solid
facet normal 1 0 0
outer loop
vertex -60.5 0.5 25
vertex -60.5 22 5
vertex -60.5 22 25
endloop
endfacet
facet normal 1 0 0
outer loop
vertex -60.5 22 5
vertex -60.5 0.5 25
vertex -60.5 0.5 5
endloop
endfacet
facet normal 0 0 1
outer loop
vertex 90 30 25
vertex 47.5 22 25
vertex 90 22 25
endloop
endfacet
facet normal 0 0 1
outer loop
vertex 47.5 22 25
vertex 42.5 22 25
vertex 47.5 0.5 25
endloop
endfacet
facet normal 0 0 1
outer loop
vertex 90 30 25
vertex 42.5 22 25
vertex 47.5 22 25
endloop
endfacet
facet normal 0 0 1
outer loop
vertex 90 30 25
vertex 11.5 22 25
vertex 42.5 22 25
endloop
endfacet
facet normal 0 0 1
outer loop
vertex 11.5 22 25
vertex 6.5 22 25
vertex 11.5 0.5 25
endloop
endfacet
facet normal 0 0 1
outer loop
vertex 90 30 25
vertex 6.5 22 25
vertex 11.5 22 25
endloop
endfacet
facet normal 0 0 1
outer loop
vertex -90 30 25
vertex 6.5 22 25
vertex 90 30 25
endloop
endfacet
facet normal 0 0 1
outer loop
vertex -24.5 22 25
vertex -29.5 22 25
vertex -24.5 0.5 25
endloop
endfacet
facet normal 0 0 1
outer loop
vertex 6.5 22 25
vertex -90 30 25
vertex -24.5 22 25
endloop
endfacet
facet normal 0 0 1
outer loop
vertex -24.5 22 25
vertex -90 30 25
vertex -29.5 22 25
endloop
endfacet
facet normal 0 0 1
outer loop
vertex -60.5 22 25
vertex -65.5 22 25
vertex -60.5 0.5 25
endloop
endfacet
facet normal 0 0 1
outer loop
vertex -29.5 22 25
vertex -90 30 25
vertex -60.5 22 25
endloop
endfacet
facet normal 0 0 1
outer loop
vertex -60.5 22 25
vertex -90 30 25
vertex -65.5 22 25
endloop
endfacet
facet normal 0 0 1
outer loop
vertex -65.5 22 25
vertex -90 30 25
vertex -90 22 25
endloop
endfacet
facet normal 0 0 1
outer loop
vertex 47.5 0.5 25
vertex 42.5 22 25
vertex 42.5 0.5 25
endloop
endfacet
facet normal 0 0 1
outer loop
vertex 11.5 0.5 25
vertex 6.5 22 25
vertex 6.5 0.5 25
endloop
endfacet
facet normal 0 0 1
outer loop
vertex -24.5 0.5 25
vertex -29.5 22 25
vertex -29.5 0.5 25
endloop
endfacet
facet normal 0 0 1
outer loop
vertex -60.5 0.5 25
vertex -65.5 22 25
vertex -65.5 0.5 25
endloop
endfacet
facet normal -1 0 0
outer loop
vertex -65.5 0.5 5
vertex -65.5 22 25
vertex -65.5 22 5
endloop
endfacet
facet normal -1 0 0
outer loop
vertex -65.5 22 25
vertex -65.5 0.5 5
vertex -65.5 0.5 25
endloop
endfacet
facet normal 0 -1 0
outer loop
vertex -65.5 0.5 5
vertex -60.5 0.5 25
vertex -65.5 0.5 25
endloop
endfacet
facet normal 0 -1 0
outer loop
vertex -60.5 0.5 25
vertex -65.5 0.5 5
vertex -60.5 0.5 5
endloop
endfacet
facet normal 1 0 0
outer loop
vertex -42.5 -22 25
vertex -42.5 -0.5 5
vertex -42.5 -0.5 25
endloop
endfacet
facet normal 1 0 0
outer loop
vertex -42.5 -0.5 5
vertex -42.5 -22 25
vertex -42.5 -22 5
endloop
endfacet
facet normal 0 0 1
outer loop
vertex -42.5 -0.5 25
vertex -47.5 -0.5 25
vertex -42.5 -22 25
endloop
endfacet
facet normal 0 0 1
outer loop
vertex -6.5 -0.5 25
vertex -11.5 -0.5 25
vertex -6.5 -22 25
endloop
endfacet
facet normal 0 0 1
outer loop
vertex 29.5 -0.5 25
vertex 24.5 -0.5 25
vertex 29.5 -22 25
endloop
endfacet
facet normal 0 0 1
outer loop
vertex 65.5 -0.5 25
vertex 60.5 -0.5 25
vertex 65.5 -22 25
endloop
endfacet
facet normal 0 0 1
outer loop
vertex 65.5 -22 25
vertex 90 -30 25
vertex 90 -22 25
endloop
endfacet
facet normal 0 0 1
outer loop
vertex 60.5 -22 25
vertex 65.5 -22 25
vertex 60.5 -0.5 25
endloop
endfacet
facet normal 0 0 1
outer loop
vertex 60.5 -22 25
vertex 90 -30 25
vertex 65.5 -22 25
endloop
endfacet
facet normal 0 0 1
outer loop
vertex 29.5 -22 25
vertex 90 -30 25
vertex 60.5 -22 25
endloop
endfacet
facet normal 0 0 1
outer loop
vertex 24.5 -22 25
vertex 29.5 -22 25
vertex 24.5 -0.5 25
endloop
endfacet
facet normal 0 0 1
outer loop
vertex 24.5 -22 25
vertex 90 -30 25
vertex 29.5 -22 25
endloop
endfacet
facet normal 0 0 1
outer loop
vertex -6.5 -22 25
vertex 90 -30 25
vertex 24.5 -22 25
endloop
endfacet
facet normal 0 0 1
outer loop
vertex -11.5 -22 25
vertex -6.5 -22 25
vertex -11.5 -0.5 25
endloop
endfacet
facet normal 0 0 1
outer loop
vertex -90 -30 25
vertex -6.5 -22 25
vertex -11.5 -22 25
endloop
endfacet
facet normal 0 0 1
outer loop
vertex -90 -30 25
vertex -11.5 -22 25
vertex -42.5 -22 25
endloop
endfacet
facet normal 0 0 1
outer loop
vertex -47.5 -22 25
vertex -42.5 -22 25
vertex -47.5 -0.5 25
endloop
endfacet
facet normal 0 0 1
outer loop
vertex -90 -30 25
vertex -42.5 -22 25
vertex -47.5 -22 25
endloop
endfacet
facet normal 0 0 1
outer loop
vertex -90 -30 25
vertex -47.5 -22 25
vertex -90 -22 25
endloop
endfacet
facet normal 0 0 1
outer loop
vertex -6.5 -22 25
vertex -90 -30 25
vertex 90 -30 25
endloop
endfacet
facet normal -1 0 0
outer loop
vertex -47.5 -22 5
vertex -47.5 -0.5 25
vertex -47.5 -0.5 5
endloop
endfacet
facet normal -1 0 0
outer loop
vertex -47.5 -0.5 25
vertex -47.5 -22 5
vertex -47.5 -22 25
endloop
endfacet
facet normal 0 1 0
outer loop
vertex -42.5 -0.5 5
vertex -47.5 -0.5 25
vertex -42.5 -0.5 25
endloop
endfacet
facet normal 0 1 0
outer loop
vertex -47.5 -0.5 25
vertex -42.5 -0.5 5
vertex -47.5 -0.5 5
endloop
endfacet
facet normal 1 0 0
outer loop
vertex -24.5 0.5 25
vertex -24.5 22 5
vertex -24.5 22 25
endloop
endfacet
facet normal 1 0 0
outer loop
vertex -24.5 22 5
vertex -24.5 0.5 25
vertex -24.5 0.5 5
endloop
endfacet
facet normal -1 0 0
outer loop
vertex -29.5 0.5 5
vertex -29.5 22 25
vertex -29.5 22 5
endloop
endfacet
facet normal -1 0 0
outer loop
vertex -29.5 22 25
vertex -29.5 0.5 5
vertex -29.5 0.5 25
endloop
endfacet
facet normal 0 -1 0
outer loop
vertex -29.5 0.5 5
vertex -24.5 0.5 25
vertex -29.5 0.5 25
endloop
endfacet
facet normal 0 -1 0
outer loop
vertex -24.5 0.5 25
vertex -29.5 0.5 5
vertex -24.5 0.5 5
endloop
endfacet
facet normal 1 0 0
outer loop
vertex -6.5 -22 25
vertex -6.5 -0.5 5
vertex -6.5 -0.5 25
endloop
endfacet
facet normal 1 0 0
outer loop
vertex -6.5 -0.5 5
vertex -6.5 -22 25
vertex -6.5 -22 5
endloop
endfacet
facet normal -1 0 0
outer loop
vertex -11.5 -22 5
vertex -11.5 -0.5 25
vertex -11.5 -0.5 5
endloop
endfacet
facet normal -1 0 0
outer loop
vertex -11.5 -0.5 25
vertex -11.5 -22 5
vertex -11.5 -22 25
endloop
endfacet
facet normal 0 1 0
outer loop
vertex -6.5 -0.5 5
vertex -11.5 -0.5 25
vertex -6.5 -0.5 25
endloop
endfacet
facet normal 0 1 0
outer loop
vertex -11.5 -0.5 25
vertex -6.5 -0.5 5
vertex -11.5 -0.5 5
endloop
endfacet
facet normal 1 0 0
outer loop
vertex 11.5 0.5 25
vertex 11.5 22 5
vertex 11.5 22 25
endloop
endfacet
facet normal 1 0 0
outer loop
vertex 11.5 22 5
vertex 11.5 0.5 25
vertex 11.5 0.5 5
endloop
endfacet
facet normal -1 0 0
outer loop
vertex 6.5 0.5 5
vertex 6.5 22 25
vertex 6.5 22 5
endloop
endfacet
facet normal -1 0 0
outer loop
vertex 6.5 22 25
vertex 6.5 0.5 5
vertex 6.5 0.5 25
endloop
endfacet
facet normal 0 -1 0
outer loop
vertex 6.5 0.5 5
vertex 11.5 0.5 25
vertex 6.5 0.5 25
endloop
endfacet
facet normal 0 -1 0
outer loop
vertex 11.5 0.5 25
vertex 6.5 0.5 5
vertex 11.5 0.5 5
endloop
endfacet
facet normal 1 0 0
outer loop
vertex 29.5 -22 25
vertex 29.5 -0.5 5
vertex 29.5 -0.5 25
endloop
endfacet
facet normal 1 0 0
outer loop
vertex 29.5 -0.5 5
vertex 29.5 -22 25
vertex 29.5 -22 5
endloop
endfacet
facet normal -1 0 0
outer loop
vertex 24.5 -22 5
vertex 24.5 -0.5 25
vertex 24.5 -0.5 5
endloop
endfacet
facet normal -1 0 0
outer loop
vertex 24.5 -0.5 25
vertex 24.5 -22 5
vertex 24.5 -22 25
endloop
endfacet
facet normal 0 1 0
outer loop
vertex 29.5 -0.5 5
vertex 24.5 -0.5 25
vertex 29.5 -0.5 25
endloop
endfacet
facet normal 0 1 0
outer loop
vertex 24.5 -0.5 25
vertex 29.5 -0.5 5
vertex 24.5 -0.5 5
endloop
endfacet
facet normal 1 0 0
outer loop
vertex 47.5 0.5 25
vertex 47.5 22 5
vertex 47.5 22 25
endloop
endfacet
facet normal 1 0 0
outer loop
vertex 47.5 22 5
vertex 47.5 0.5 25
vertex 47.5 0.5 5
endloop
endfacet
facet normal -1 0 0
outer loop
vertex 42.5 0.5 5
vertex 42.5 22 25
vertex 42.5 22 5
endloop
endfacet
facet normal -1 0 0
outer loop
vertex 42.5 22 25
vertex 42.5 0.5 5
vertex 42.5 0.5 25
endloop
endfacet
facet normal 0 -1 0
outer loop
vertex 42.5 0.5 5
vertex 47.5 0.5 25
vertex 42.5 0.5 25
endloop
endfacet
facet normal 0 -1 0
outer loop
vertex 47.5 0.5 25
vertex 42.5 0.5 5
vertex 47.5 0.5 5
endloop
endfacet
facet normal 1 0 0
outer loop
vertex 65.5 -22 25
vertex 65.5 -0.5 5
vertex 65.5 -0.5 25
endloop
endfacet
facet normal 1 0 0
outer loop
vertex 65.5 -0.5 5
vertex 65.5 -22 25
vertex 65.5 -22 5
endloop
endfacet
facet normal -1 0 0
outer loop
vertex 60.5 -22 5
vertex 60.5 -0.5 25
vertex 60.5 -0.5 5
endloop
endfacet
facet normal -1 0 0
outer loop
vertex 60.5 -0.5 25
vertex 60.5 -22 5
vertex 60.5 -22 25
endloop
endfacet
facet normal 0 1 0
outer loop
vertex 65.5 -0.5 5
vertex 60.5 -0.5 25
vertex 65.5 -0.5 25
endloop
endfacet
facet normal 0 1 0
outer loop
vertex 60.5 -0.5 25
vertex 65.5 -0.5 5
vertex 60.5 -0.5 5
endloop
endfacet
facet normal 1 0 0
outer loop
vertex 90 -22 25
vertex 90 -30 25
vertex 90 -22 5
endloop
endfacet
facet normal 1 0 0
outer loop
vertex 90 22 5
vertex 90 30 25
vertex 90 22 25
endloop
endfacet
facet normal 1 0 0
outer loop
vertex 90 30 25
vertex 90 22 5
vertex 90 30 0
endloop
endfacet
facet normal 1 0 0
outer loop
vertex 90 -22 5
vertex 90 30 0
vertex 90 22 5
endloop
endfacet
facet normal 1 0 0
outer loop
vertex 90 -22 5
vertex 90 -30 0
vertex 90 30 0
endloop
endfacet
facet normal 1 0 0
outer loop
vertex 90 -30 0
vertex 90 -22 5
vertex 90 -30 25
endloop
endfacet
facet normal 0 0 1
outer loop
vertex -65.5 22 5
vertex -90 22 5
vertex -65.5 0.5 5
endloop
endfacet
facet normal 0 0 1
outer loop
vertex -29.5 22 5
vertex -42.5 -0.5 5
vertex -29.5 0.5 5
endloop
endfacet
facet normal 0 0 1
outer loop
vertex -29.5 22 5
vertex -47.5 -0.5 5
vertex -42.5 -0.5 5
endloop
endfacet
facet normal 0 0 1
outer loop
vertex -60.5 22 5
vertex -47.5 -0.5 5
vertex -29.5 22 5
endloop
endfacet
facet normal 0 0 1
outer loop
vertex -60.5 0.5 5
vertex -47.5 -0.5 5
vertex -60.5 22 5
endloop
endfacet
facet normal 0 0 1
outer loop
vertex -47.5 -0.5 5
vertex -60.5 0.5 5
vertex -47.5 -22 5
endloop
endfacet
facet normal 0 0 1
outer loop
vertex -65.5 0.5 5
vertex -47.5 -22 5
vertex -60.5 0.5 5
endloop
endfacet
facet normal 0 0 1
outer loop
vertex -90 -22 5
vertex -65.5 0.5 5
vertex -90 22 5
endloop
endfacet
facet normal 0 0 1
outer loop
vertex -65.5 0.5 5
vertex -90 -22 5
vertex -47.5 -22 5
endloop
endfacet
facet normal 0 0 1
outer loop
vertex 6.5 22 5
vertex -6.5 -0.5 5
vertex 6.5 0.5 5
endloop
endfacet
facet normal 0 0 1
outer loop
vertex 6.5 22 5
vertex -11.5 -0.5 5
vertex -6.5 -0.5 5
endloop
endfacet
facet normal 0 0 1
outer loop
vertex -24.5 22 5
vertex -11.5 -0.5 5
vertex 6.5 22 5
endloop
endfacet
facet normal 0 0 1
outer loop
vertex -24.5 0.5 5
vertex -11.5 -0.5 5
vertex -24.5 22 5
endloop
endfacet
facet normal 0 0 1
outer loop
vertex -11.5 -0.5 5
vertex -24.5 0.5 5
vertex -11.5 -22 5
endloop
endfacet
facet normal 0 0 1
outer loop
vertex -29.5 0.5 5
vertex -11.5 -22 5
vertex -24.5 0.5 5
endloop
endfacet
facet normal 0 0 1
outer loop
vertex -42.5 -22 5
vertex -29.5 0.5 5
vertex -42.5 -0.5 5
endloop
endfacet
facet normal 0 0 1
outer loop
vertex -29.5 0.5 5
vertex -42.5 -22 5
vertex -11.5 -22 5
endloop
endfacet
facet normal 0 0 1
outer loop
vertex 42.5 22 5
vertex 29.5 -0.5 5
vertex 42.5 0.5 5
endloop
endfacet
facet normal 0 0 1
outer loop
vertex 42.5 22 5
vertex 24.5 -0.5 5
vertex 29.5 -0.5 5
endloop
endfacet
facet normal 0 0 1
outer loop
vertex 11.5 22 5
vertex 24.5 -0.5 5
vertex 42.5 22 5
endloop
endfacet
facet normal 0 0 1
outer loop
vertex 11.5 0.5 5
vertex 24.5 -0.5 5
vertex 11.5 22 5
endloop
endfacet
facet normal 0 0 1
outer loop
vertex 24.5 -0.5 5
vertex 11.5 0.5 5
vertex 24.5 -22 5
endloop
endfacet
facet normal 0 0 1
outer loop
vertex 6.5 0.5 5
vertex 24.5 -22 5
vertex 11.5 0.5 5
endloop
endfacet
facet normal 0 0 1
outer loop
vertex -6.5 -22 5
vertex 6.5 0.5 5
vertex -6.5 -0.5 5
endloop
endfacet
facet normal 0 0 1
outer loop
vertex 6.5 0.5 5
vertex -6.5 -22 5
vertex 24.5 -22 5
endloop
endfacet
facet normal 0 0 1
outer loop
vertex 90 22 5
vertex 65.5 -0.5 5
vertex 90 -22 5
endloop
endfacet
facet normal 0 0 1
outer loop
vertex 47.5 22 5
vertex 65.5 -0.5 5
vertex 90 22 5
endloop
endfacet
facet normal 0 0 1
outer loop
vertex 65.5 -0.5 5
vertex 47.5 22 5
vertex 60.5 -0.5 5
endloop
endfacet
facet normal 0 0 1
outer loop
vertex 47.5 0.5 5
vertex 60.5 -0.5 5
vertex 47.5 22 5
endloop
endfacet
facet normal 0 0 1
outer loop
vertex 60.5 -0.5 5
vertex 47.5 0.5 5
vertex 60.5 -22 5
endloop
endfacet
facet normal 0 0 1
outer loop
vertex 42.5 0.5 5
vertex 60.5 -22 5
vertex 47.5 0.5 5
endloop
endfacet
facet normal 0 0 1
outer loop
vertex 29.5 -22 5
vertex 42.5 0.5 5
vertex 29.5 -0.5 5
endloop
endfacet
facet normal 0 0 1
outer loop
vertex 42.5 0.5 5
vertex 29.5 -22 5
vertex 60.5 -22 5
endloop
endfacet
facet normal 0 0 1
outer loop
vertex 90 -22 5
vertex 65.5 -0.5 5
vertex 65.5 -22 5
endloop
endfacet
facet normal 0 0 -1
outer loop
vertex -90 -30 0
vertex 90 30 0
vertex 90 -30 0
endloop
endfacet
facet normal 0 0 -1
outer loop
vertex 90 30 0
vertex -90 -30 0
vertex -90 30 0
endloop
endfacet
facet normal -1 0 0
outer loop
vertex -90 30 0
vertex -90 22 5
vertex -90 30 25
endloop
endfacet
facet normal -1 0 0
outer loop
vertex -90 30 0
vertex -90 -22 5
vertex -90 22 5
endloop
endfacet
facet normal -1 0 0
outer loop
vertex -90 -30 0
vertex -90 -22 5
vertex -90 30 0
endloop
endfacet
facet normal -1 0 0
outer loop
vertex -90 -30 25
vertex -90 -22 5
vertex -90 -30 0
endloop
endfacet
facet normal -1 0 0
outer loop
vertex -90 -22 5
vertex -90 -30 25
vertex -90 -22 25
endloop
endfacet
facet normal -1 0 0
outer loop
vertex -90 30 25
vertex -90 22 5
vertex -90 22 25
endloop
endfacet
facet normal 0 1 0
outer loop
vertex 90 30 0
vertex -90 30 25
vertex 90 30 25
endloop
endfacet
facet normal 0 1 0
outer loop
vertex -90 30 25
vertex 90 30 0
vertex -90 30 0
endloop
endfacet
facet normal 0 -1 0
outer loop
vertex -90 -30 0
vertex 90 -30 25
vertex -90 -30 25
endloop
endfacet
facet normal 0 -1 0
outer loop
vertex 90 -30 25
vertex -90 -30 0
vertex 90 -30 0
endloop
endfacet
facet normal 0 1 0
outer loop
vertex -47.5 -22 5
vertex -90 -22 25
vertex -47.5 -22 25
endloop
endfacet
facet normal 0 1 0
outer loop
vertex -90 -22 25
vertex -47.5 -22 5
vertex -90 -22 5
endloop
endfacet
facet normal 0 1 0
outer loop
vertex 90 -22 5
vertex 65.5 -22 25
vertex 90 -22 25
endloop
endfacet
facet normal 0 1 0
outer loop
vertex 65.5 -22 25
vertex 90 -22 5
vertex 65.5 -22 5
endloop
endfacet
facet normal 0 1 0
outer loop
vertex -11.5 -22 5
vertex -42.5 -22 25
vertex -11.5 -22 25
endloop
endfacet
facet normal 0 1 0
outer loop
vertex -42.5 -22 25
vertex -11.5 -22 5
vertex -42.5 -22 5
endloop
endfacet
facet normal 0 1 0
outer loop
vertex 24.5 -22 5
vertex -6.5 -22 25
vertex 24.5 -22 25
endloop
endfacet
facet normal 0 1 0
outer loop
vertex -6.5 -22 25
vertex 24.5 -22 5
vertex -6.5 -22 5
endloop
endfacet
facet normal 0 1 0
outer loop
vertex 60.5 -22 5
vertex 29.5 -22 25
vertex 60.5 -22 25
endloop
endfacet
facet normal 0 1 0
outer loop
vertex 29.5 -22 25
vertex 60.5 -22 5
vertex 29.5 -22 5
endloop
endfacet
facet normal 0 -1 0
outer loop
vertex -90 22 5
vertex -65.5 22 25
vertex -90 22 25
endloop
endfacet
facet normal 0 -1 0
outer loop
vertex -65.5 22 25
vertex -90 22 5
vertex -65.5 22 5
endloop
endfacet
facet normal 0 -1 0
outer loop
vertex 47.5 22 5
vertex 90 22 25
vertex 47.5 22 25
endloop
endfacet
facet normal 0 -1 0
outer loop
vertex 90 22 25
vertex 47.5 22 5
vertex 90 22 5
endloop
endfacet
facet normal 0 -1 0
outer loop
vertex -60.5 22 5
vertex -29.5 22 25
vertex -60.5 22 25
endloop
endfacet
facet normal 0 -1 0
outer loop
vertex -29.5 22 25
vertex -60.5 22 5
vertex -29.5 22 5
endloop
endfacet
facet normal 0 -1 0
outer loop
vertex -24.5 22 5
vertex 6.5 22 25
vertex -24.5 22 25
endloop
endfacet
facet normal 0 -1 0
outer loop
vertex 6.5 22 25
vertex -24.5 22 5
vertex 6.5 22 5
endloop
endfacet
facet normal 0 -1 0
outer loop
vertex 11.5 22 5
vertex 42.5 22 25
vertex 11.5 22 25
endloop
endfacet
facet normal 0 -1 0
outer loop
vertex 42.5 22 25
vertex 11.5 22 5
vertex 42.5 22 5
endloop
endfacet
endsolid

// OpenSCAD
$fn = 32;

// ----------------------------------------------------------------------
// Rib frame 180 x 60 x 25
// 8 ribs at 18 mm pitch, staggered
// ----------------------------------------------------------------------

// --- parameters (mm) ---
frame = [180, 60, 5];  // base plate size (x, y, z)
rail_w = 8;            // side rail width
ribs = 8;              // number of ribs
rib_t = 5;             // rib thickness
rib_h = 20;            // rib height above the base plate
pitch = 18;            // pitch between rib centres

// --- derived feature positions (mm) ---
span = (ribs - 1) * pitch;          // = 126   distance between the outer ribs
origin_x = -span / 2;               // = -63   X of the first rib
rib_len = frame[1] / 2 - rail_w + 0.5;  // = 22.5   length of a staggered rib
rib_y = 0.5 + rib_len / 2;          // = 11.75   Y of a staggered rib centre
row_offset = 2 * rib_y;             // = 23.5   distance between the two rows
feature_centers = [
  [origin_x + 0 * pitch, rib_y],
  [origin_x + 1 * pitch, -rib_y],
  [origin_x + 2 * pitch, rib_y],
  [origin_x + 3 * pitch, -rib_y],
  [origin_x + 4 * pitch, rib_y],
  [origin_x + 5 * pitch, -rib_y],
  [origin_x + 6 * pitch, rib_y],
  [origin_x + 7 * pitch, -rib_y]
];   // rib centre line, drives the rib loop

// base plate, two side rails, then the ribs read straight off feature_centers
union() {
  translate([-frame[0] / 2, -frame[1] / 2, 0]) cube(frame);
  translate([-frame[0] / 2, -frame[1] / 2, 0]) cube([frame[0], rail_w, frame[2] + rib_h]);
  translate([-frame[0] / 2, frame[1] / 2 - rail_w, 0]) cube([frame[0], rail_w, frame[2] + rib_h]);
  for (centre = feature_centers)
    translate([centre[0] - rib_t / 2, centre[1] - rib_len / 2, frame[2] - 1])
      cube([rib_t, rib_len, rib_h + 1]);
}
